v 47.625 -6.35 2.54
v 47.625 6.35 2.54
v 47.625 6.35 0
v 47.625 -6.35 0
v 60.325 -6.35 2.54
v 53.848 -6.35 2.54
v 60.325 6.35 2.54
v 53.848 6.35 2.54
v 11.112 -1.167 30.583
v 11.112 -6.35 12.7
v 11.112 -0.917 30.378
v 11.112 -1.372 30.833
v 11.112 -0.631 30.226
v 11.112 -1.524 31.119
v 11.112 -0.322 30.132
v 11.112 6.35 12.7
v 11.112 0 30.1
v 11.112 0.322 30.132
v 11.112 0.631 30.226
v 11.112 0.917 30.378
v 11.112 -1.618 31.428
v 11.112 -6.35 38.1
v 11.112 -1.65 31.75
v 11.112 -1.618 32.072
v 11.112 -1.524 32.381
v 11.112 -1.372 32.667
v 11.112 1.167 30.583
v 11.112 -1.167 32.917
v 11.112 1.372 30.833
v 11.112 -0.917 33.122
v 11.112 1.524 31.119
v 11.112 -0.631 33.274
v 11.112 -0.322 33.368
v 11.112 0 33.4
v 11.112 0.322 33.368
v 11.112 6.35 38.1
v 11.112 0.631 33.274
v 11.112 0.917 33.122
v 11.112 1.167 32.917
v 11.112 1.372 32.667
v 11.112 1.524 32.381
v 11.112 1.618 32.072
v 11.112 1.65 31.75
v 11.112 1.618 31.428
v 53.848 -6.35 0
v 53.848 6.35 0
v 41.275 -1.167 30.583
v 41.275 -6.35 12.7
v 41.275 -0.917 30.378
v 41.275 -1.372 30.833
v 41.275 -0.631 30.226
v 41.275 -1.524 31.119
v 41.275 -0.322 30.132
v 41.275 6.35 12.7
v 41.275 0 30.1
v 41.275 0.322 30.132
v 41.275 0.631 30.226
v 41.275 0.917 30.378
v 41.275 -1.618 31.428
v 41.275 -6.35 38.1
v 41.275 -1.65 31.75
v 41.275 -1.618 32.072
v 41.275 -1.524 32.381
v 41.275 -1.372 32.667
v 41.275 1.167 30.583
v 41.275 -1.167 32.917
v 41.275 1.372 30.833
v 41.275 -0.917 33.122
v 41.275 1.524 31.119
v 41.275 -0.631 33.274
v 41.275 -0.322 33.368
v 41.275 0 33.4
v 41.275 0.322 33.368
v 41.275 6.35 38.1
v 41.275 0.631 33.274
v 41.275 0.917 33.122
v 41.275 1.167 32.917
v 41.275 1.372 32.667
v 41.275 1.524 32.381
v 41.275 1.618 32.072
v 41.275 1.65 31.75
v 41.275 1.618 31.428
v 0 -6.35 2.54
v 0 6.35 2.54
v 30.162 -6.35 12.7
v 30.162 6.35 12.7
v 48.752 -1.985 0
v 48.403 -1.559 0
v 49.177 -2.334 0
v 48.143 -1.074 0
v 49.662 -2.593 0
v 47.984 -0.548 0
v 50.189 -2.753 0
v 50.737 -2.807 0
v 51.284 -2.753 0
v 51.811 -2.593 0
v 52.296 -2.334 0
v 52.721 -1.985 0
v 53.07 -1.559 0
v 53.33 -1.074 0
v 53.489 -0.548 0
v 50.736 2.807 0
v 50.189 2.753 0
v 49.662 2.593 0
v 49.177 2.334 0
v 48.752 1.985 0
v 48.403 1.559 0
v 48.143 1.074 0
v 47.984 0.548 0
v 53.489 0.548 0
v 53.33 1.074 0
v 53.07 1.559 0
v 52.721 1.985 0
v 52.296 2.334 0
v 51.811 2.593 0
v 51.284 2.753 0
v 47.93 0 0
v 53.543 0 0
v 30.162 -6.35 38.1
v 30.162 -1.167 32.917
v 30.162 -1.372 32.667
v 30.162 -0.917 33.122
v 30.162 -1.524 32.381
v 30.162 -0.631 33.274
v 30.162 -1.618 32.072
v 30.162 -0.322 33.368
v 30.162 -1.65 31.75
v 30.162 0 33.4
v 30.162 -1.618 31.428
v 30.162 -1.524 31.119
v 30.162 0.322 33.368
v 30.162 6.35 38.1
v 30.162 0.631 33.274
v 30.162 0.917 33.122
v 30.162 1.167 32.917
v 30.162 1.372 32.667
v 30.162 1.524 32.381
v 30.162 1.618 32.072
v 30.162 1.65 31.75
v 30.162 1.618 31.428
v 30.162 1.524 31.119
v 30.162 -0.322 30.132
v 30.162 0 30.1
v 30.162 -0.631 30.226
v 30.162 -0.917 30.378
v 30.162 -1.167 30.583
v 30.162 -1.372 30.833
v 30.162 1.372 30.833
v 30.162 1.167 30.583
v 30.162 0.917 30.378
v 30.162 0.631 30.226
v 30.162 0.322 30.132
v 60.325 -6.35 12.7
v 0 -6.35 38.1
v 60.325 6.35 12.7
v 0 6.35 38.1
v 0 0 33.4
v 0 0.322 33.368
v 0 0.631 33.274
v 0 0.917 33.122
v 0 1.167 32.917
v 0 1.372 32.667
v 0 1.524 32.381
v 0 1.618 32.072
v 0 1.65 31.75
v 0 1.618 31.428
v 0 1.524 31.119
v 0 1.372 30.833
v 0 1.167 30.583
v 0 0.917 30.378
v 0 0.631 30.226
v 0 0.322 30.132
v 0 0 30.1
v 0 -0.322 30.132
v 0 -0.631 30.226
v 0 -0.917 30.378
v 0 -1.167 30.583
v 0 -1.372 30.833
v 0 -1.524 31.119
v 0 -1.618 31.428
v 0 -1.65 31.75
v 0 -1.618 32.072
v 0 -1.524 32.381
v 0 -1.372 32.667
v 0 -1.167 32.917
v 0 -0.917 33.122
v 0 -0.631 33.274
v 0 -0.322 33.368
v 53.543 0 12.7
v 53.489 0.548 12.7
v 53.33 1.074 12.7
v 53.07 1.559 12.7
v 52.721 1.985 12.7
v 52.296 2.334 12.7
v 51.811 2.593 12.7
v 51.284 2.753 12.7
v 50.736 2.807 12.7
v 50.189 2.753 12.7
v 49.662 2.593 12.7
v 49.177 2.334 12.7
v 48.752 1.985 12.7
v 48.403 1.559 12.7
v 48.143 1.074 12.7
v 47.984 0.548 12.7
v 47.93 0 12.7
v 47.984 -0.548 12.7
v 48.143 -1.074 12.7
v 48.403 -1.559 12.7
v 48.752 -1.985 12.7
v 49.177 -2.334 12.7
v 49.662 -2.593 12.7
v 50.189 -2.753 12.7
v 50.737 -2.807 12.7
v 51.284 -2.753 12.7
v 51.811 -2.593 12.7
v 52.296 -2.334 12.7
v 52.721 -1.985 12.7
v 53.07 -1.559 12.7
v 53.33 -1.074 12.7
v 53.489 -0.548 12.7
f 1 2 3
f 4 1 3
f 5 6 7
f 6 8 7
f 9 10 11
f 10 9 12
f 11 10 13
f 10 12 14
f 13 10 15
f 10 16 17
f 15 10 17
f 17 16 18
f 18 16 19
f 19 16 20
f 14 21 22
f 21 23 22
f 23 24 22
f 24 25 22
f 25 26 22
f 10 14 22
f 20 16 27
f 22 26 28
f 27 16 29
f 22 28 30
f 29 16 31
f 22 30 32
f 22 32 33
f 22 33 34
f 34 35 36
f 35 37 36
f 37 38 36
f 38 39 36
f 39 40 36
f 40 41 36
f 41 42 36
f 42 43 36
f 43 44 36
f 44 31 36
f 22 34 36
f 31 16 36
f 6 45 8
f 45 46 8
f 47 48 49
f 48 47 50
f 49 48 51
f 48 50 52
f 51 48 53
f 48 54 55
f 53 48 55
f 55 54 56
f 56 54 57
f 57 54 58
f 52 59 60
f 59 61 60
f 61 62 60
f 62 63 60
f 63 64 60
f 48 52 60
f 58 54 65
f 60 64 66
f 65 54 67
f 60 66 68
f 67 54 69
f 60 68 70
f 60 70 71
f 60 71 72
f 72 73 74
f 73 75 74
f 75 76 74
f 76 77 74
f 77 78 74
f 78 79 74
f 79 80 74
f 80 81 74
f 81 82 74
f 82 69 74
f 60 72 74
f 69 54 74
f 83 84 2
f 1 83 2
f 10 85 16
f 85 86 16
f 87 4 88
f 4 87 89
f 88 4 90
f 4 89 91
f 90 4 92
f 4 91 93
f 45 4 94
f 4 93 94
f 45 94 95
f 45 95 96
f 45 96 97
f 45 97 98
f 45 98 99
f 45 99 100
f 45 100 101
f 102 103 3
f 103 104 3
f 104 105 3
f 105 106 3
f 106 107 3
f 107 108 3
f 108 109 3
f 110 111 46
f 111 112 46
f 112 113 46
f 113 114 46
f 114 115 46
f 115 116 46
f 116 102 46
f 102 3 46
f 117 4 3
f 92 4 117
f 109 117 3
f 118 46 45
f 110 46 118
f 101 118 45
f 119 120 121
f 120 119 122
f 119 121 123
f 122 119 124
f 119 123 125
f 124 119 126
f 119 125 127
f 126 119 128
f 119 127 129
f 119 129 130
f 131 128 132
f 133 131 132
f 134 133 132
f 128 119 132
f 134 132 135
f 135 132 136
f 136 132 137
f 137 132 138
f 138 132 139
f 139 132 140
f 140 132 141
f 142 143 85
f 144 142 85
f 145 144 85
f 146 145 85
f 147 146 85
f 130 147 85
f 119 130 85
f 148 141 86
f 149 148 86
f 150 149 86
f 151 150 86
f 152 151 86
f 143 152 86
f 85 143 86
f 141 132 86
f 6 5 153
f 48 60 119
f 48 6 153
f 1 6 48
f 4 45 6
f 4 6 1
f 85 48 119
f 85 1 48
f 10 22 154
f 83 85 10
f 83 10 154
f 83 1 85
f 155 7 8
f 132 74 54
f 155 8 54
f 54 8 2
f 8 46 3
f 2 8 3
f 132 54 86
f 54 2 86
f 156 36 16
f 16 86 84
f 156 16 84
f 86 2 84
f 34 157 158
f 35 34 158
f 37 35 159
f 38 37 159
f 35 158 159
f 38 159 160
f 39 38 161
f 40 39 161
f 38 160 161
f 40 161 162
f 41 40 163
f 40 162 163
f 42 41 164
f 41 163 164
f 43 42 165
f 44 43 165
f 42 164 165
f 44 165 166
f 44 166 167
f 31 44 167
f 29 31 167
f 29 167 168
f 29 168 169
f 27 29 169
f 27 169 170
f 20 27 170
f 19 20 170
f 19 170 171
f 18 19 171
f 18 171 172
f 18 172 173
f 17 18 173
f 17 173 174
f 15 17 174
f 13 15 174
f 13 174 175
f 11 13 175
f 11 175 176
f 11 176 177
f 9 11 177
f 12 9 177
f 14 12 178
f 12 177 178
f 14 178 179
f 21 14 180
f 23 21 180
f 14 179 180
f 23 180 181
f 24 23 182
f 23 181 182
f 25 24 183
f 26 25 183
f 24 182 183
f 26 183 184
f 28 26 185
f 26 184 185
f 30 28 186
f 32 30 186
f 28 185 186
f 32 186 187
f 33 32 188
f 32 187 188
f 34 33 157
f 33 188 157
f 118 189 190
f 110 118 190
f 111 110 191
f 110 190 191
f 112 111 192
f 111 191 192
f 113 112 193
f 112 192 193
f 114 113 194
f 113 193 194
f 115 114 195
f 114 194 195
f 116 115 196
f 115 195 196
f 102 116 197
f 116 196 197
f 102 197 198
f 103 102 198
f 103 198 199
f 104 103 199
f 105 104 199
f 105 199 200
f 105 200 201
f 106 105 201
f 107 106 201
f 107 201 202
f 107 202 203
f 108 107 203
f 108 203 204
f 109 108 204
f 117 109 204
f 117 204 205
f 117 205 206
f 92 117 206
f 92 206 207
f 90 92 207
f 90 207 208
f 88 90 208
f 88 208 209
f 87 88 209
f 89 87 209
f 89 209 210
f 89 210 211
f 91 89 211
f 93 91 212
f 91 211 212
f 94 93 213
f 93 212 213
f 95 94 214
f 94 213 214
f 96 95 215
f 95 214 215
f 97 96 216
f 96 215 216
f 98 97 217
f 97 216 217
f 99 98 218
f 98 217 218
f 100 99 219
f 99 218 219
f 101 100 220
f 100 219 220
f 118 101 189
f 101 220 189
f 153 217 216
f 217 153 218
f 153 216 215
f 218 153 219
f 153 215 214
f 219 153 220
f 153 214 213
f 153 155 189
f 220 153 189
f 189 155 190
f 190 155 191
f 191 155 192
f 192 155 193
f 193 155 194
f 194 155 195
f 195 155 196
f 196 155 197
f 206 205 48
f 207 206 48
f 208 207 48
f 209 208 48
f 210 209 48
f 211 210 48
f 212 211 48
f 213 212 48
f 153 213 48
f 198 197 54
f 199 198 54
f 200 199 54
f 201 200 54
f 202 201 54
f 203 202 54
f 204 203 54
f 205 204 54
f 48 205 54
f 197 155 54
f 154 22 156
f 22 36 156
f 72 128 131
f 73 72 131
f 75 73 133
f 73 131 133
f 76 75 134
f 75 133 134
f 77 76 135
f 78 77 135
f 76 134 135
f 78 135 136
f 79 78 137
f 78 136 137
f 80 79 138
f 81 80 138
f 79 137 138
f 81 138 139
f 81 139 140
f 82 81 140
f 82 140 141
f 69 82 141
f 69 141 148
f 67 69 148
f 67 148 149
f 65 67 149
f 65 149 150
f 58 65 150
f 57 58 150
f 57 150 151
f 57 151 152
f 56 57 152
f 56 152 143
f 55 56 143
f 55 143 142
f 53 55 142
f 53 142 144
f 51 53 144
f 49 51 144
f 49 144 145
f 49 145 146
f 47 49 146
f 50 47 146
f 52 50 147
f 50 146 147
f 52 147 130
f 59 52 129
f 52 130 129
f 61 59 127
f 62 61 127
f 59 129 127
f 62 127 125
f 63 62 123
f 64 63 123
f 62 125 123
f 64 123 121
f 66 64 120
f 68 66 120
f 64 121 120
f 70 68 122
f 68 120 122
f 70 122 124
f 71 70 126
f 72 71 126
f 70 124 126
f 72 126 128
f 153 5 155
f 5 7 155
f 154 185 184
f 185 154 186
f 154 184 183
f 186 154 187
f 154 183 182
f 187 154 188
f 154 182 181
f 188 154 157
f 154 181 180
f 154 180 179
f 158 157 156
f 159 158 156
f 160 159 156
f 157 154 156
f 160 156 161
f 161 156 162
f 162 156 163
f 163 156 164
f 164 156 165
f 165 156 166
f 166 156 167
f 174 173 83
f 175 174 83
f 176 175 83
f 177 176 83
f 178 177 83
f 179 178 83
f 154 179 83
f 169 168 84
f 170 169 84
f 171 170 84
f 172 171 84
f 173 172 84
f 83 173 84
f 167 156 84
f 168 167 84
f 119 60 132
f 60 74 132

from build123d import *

# Parameters (mm, degrees)
EXTRUDE1_DEPTH         = 6.35
M4X0_7_TAPPED_HOLE1_D  = 3.3
F_10_CLEARANCE_HOLE1_D = 5.6134


with BuildPart() as part:
    # Sketch1 → Extrude1 (new, symmetric)
    with BuildSketch(Plane(origin=(0, 0, 0), x_dir=(1, 0, 0), z_dir=(0, 1, 0))):
        Polygon((47.625, 0), (53.848, 0), (53.848, -2.54), (60.325, -2.54), (60.325, -12.7), (41.275, -12.7), (41.275, -38.1), (30.1625, -38.1), (30.1625, -12.7), (11.1125, -12.7), (11.1125, -38.1), (0, -38.1), (0, -2.54), (47.625, -2.54), align=None)
    extrude(amount=EXTRUDE1_DEPTH, both=True)

    # M4x0.7 Tapped Hole1 (through all)
    with Locations(Plane(origin=(41.275, 0, 0), x_dir=(0, 0, -1), z_dir=(1, 0, 0))):
        with Locations((-31.75, 0)):
            Hole(M4X0_7_TAPPED_HOLE1_D / 2)

    # #10 Clearance Hole1 (through all)
    with Locations(Plane(origin=(0, 0, 0), x_dir=(-1, 0, 0), z_dir=(0, 0, -1))):
        with Locations((-50.7365, 0)):
            Hole(F_10_CLEARANCE_HOLE1_D / 2)


solid = part.part
